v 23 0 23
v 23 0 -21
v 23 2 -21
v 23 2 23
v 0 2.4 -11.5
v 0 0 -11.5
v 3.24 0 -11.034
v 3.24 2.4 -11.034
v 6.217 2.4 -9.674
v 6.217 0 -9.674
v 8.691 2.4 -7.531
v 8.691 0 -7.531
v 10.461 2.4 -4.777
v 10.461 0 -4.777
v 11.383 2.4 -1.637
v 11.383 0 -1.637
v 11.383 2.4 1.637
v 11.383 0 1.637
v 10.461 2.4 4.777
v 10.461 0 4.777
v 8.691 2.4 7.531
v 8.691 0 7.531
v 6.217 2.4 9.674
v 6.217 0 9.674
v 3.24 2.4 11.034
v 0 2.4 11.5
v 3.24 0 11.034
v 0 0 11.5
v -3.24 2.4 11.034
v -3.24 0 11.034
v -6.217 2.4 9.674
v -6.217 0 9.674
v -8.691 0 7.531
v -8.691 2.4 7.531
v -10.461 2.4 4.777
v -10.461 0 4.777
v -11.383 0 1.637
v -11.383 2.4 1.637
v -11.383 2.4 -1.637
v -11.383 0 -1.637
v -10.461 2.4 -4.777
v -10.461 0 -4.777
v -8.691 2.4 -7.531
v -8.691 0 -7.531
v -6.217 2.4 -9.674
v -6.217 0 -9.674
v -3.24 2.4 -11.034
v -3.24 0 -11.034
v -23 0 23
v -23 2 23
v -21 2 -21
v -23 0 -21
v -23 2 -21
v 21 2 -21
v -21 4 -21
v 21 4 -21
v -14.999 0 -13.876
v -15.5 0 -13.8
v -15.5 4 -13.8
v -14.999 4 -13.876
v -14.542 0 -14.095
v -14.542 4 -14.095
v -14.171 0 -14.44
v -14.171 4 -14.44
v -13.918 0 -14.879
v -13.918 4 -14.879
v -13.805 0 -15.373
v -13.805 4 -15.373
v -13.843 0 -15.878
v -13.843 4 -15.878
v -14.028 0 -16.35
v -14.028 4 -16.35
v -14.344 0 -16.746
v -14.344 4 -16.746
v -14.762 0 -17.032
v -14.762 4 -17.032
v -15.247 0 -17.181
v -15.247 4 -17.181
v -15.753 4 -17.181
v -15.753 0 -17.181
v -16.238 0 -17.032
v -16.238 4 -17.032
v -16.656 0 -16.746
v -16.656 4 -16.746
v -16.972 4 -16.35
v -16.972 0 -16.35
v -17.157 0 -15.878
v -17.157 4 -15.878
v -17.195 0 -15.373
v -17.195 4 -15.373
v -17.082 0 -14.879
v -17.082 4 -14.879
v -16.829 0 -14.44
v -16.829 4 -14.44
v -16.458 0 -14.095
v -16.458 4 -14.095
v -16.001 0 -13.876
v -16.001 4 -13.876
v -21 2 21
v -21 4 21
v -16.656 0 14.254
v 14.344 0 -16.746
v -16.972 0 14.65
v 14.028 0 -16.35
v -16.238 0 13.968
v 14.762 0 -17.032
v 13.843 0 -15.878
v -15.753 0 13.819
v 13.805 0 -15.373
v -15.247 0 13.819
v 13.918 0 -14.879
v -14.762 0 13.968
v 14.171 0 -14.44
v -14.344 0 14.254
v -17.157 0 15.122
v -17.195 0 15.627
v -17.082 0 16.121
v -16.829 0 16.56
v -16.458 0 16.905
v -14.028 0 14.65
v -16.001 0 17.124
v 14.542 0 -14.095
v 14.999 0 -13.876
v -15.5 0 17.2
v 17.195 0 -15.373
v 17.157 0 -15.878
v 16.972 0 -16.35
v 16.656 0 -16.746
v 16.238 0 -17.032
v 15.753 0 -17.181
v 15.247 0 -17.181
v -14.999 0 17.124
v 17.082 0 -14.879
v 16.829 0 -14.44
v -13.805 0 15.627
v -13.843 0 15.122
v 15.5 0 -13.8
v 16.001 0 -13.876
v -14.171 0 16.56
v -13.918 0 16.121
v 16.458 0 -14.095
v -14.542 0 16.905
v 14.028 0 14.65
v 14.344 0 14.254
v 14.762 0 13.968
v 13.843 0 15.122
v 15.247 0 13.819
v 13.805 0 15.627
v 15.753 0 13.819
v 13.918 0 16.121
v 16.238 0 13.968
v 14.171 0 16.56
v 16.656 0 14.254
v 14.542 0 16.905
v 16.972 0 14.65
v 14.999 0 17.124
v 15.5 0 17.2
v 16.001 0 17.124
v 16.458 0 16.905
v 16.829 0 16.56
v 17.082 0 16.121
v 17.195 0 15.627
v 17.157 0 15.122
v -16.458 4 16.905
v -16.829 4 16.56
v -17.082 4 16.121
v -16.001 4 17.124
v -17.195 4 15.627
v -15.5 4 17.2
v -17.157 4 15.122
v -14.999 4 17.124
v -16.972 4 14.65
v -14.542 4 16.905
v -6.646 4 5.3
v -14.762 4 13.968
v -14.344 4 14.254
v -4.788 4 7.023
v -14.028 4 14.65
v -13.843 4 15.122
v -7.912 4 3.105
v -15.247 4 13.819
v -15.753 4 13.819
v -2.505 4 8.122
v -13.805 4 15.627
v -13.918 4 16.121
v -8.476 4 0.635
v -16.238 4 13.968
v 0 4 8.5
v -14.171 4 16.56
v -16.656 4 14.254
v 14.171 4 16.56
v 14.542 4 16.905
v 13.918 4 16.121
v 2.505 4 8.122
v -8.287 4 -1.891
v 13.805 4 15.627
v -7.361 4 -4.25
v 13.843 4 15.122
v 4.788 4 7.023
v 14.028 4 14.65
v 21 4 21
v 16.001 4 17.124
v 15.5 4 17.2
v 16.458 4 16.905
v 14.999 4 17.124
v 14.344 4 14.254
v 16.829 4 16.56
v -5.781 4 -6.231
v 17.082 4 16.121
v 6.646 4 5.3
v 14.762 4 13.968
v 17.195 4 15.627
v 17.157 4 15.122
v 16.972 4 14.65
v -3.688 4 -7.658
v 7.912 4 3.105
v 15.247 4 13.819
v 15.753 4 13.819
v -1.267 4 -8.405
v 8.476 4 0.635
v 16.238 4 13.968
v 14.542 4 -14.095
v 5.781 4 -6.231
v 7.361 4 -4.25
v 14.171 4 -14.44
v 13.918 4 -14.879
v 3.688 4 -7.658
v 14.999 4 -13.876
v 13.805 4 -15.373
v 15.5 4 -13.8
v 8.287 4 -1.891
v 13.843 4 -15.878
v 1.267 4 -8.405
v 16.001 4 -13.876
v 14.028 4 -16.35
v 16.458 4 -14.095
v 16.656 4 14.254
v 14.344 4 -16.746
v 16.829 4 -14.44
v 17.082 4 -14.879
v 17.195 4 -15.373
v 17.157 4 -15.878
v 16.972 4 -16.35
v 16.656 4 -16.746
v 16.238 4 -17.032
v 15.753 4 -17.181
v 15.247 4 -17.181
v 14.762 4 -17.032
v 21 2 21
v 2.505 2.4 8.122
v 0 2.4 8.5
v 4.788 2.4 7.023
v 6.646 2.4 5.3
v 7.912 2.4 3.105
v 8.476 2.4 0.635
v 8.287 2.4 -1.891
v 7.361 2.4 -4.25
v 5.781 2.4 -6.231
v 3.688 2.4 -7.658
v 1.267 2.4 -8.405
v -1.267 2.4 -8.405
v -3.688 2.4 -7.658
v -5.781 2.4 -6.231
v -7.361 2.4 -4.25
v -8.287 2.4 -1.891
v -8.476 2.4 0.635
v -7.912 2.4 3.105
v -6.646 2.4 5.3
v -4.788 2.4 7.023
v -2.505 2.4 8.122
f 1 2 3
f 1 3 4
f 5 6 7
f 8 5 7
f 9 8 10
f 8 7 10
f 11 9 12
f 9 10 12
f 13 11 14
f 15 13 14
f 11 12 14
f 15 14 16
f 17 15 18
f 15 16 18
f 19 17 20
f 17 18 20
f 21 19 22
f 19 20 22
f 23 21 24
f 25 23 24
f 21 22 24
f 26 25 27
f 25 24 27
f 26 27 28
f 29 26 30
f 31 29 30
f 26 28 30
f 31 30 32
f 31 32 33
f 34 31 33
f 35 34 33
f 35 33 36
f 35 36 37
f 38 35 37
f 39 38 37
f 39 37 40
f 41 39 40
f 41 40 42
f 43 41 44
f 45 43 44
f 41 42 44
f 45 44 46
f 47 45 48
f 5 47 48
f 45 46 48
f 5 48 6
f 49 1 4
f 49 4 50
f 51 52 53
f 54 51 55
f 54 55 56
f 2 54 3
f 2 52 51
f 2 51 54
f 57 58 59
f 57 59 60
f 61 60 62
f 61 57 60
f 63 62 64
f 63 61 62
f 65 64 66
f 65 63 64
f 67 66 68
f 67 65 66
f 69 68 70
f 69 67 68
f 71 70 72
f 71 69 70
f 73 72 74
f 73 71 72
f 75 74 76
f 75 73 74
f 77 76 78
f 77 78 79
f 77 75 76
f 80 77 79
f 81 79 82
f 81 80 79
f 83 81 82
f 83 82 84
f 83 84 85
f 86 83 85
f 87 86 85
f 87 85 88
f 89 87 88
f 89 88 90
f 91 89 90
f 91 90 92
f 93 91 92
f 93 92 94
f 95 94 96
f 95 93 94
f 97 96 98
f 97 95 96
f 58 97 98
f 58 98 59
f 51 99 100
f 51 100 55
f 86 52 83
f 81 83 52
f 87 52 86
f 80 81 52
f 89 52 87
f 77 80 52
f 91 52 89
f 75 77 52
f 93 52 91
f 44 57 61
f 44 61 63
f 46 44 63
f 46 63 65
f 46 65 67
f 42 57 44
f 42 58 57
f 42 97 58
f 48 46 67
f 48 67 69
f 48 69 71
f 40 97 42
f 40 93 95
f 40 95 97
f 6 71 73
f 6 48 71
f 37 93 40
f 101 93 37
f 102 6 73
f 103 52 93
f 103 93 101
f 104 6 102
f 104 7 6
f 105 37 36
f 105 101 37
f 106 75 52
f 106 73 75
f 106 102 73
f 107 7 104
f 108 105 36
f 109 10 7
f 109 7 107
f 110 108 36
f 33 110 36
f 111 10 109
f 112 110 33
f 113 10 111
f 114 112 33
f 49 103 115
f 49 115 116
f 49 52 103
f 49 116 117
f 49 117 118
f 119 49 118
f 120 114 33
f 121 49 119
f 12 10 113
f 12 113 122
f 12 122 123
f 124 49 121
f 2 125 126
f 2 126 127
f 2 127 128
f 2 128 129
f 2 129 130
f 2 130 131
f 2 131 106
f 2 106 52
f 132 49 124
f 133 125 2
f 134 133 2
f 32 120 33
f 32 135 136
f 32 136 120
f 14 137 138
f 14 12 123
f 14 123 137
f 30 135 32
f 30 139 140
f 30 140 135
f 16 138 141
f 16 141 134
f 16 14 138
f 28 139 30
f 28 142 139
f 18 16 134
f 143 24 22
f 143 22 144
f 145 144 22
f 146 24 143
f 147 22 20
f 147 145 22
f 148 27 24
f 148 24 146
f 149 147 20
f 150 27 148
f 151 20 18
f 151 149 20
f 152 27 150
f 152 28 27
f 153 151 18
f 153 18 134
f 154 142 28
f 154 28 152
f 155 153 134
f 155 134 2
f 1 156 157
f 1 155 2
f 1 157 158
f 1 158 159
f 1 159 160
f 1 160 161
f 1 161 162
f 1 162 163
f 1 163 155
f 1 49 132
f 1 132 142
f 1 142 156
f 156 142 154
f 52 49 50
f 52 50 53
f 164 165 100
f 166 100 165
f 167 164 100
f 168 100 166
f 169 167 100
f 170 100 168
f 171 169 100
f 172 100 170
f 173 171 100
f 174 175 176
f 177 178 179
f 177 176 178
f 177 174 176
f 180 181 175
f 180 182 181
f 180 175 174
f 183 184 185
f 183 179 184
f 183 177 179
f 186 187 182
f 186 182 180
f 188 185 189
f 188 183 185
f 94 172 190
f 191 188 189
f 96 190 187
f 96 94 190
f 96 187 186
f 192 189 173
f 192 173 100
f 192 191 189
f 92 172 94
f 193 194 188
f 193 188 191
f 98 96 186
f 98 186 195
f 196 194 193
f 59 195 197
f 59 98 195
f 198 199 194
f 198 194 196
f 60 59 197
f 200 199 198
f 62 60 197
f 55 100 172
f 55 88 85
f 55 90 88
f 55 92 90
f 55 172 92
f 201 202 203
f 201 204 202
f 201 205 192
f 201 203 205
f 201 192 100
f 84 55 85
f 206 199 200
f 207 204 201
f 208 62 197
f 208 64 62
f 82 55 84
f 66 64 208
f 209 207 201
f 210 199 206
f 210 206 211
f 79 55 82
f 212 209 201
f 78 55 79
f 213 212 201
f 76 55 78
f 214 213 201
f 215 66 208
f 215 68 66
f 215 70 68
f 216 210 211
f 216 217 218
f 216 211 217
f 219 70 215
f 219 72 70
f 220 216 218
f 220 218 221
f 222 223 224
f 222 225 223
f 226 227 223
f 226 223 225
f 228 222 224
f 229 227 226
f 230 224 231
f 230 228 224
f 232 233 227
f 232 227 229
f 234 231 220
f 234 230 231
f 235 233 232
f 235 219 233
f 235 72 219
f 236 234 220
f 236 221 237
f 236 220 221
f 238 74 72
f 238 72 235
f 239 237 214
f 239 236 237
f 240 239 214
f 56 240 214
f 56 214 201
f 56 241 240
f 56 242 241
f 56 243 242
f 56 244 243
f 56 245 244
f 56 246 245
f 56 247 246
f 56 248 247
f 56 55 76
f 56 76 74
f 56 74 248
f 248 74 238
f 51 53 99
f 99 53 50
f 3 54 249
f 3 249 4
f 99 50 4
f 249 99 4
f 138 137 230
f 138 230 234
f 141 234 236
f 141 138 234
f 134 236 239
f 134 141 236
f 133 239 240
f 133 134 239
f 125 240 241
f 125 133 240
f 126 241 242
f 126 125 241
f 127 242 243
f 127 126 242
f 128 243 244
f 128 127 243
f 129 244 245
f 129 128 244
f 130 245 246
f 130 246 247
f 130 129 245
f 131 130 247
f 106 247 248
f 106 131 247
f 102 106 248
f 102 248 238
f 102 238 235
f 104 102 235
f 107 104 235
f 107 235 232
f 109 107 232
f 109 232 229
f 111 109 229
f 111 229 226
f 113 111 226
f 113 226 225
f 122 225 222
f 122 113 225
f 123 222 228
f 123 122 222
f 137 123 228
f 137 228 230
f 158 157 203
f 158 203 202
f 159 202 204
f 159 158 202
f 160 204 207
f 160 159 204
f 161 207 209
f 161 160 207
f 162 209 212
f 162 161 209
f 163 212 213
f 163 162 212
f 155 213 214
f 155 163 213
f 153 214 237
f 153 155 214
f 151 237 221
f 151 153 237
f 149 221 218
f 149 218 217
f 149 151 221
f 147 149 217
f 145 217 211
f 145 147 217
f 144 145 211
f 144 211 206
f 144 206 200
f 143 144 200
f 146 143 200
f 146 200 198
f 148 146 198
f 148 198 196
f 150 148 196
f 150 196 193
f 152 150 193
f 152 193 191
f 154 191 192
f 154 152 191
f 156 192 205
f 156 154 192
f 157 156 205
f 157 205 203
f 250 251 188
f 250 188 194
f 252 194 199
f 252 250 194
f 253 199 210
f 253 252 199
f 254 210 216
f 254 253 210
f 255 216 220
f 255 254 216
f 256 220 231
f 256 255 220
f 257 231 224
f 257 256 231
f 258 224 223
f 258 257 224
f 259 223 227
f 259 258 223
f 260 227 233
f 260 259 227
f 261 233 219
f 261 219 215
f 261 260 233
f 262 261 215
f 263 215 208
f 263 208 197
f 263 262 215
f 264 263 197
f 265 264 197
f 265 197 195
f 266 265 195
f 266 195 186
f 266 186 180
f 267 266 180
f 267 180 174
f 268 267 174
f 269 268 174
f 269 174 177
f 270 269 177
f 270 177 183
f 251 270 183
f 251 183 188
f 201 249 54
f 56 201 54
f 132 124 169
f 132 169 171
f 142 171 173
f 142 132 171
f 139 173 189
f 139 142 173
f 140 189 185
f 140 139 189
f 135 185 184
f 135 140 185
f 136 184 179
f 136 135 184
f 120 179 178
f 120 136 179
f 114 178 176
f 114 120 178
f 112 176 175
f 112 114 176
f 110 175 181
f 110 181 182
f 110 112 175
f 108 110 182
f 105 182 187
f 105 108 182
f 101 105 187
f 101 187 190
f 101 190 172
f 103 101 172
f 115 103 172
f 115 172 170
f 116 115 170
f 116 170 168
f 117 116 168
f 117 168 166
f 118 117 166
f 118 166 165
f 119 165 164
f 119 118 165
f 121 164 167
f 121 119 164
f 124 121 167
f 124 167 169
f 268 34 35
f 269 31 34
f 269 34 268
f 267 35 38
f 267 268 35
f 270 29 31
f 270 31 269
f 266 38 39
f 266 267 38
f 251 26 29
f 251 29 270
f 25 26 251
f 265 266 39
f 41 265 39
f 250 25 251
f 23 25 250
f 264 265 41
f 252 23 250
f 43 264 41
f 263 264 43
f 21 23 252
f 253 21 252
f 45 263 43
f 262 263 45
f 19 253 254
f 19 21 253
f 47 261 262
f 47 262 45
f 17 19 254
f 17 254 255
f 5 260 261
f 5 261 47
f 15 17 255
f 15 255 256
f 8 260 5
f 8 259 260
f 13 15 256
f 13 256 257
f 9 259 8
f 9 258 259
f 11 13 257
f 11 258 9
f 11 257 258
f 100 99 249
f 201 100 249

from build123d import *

# Parameters (mm, degrees)
SKIZZE1_W                       = 42
SKIZZE1_H                       = 42
SKIZZE1_R                       = 1.7
SKIZZE1_R_2                     = 8.5
AUFSATZ_LINEAR_AUSTRAGEN1_DEPTH = 4
SKIZZE2_R                       = 11.5
SCHNITT_LINEAR_AUSTRAGEN1_DEPTH = 2.4
AUFSATZ_LINEAR_AUSTRAGEN2_DEPTH = 2


with BuildPart() as part:
    # Skizze1 → Aufsatz-Linear austragen1 (new body)
    with BuildSketch(Plane(origin=(0, 0, 0), x_dir=(1, 0, 0), z_dir=(0, 1, 0))):
        Rectangle(SKIZZE1_W, SKIZZE1_H)
        with Locations(Location((-15.5, 15.5, 0), (0, 0, 270))):
            Circle(SKIZZE1_R, mode=Mode.SUBTRACT)
        with Locations(Location((15.5, 15.5, 0), (0, 0, 270))):
            Circle(SKIZZE1_R, mode=Mode.SUBTRACT)
        with Locations(Location((-15.5, -15.5, 0), (0, 0, 270))):
            Circle(SKIZZE1_R, mode=Mode.SUBTRACT)
        with Locations(Location((15.5, -15.5, 0), (0, 0, 270))):
            Circle(SKIZZE1_R, mode=Mode.SUBTRACT)
        with Locations(Location((0, 0, 0), (0, 0, 270))):
            Circle(SKIZZE1_R_2, mode=Mode.SUBTRACT)
    extrude(amount=AUFSATZ_LINEAR_AUSTRAGEN1_DEPTH)

    # Skizze2 → Schnitt-Linear austragen1 (cut)
    with BuildSketch(Plane.XZ):
        with Locations(Location((0, 0, 0), (0, 0, 270))):
            Circle(SKIZZE2_R)
    extrude(amount=-SCHNITT_LINEAR_AUSTRAGEN1_DEPTH, mode=Mode.SUBTRACT)

    # Skizze4 → Aufsatz-Linear austragen2 (add)
    with BuildSketch(Plane.XZ):
        Polygon((-21, -21), (-21, 21), (21, 21), (21, -21), (23, -21), (23, 23), (-23, 23), (-23, -21), align=None)
    extrude(amount=-AUFSATZ_LINEAR_AUSTRAGEN2_DEPTH)


solid = part.part
